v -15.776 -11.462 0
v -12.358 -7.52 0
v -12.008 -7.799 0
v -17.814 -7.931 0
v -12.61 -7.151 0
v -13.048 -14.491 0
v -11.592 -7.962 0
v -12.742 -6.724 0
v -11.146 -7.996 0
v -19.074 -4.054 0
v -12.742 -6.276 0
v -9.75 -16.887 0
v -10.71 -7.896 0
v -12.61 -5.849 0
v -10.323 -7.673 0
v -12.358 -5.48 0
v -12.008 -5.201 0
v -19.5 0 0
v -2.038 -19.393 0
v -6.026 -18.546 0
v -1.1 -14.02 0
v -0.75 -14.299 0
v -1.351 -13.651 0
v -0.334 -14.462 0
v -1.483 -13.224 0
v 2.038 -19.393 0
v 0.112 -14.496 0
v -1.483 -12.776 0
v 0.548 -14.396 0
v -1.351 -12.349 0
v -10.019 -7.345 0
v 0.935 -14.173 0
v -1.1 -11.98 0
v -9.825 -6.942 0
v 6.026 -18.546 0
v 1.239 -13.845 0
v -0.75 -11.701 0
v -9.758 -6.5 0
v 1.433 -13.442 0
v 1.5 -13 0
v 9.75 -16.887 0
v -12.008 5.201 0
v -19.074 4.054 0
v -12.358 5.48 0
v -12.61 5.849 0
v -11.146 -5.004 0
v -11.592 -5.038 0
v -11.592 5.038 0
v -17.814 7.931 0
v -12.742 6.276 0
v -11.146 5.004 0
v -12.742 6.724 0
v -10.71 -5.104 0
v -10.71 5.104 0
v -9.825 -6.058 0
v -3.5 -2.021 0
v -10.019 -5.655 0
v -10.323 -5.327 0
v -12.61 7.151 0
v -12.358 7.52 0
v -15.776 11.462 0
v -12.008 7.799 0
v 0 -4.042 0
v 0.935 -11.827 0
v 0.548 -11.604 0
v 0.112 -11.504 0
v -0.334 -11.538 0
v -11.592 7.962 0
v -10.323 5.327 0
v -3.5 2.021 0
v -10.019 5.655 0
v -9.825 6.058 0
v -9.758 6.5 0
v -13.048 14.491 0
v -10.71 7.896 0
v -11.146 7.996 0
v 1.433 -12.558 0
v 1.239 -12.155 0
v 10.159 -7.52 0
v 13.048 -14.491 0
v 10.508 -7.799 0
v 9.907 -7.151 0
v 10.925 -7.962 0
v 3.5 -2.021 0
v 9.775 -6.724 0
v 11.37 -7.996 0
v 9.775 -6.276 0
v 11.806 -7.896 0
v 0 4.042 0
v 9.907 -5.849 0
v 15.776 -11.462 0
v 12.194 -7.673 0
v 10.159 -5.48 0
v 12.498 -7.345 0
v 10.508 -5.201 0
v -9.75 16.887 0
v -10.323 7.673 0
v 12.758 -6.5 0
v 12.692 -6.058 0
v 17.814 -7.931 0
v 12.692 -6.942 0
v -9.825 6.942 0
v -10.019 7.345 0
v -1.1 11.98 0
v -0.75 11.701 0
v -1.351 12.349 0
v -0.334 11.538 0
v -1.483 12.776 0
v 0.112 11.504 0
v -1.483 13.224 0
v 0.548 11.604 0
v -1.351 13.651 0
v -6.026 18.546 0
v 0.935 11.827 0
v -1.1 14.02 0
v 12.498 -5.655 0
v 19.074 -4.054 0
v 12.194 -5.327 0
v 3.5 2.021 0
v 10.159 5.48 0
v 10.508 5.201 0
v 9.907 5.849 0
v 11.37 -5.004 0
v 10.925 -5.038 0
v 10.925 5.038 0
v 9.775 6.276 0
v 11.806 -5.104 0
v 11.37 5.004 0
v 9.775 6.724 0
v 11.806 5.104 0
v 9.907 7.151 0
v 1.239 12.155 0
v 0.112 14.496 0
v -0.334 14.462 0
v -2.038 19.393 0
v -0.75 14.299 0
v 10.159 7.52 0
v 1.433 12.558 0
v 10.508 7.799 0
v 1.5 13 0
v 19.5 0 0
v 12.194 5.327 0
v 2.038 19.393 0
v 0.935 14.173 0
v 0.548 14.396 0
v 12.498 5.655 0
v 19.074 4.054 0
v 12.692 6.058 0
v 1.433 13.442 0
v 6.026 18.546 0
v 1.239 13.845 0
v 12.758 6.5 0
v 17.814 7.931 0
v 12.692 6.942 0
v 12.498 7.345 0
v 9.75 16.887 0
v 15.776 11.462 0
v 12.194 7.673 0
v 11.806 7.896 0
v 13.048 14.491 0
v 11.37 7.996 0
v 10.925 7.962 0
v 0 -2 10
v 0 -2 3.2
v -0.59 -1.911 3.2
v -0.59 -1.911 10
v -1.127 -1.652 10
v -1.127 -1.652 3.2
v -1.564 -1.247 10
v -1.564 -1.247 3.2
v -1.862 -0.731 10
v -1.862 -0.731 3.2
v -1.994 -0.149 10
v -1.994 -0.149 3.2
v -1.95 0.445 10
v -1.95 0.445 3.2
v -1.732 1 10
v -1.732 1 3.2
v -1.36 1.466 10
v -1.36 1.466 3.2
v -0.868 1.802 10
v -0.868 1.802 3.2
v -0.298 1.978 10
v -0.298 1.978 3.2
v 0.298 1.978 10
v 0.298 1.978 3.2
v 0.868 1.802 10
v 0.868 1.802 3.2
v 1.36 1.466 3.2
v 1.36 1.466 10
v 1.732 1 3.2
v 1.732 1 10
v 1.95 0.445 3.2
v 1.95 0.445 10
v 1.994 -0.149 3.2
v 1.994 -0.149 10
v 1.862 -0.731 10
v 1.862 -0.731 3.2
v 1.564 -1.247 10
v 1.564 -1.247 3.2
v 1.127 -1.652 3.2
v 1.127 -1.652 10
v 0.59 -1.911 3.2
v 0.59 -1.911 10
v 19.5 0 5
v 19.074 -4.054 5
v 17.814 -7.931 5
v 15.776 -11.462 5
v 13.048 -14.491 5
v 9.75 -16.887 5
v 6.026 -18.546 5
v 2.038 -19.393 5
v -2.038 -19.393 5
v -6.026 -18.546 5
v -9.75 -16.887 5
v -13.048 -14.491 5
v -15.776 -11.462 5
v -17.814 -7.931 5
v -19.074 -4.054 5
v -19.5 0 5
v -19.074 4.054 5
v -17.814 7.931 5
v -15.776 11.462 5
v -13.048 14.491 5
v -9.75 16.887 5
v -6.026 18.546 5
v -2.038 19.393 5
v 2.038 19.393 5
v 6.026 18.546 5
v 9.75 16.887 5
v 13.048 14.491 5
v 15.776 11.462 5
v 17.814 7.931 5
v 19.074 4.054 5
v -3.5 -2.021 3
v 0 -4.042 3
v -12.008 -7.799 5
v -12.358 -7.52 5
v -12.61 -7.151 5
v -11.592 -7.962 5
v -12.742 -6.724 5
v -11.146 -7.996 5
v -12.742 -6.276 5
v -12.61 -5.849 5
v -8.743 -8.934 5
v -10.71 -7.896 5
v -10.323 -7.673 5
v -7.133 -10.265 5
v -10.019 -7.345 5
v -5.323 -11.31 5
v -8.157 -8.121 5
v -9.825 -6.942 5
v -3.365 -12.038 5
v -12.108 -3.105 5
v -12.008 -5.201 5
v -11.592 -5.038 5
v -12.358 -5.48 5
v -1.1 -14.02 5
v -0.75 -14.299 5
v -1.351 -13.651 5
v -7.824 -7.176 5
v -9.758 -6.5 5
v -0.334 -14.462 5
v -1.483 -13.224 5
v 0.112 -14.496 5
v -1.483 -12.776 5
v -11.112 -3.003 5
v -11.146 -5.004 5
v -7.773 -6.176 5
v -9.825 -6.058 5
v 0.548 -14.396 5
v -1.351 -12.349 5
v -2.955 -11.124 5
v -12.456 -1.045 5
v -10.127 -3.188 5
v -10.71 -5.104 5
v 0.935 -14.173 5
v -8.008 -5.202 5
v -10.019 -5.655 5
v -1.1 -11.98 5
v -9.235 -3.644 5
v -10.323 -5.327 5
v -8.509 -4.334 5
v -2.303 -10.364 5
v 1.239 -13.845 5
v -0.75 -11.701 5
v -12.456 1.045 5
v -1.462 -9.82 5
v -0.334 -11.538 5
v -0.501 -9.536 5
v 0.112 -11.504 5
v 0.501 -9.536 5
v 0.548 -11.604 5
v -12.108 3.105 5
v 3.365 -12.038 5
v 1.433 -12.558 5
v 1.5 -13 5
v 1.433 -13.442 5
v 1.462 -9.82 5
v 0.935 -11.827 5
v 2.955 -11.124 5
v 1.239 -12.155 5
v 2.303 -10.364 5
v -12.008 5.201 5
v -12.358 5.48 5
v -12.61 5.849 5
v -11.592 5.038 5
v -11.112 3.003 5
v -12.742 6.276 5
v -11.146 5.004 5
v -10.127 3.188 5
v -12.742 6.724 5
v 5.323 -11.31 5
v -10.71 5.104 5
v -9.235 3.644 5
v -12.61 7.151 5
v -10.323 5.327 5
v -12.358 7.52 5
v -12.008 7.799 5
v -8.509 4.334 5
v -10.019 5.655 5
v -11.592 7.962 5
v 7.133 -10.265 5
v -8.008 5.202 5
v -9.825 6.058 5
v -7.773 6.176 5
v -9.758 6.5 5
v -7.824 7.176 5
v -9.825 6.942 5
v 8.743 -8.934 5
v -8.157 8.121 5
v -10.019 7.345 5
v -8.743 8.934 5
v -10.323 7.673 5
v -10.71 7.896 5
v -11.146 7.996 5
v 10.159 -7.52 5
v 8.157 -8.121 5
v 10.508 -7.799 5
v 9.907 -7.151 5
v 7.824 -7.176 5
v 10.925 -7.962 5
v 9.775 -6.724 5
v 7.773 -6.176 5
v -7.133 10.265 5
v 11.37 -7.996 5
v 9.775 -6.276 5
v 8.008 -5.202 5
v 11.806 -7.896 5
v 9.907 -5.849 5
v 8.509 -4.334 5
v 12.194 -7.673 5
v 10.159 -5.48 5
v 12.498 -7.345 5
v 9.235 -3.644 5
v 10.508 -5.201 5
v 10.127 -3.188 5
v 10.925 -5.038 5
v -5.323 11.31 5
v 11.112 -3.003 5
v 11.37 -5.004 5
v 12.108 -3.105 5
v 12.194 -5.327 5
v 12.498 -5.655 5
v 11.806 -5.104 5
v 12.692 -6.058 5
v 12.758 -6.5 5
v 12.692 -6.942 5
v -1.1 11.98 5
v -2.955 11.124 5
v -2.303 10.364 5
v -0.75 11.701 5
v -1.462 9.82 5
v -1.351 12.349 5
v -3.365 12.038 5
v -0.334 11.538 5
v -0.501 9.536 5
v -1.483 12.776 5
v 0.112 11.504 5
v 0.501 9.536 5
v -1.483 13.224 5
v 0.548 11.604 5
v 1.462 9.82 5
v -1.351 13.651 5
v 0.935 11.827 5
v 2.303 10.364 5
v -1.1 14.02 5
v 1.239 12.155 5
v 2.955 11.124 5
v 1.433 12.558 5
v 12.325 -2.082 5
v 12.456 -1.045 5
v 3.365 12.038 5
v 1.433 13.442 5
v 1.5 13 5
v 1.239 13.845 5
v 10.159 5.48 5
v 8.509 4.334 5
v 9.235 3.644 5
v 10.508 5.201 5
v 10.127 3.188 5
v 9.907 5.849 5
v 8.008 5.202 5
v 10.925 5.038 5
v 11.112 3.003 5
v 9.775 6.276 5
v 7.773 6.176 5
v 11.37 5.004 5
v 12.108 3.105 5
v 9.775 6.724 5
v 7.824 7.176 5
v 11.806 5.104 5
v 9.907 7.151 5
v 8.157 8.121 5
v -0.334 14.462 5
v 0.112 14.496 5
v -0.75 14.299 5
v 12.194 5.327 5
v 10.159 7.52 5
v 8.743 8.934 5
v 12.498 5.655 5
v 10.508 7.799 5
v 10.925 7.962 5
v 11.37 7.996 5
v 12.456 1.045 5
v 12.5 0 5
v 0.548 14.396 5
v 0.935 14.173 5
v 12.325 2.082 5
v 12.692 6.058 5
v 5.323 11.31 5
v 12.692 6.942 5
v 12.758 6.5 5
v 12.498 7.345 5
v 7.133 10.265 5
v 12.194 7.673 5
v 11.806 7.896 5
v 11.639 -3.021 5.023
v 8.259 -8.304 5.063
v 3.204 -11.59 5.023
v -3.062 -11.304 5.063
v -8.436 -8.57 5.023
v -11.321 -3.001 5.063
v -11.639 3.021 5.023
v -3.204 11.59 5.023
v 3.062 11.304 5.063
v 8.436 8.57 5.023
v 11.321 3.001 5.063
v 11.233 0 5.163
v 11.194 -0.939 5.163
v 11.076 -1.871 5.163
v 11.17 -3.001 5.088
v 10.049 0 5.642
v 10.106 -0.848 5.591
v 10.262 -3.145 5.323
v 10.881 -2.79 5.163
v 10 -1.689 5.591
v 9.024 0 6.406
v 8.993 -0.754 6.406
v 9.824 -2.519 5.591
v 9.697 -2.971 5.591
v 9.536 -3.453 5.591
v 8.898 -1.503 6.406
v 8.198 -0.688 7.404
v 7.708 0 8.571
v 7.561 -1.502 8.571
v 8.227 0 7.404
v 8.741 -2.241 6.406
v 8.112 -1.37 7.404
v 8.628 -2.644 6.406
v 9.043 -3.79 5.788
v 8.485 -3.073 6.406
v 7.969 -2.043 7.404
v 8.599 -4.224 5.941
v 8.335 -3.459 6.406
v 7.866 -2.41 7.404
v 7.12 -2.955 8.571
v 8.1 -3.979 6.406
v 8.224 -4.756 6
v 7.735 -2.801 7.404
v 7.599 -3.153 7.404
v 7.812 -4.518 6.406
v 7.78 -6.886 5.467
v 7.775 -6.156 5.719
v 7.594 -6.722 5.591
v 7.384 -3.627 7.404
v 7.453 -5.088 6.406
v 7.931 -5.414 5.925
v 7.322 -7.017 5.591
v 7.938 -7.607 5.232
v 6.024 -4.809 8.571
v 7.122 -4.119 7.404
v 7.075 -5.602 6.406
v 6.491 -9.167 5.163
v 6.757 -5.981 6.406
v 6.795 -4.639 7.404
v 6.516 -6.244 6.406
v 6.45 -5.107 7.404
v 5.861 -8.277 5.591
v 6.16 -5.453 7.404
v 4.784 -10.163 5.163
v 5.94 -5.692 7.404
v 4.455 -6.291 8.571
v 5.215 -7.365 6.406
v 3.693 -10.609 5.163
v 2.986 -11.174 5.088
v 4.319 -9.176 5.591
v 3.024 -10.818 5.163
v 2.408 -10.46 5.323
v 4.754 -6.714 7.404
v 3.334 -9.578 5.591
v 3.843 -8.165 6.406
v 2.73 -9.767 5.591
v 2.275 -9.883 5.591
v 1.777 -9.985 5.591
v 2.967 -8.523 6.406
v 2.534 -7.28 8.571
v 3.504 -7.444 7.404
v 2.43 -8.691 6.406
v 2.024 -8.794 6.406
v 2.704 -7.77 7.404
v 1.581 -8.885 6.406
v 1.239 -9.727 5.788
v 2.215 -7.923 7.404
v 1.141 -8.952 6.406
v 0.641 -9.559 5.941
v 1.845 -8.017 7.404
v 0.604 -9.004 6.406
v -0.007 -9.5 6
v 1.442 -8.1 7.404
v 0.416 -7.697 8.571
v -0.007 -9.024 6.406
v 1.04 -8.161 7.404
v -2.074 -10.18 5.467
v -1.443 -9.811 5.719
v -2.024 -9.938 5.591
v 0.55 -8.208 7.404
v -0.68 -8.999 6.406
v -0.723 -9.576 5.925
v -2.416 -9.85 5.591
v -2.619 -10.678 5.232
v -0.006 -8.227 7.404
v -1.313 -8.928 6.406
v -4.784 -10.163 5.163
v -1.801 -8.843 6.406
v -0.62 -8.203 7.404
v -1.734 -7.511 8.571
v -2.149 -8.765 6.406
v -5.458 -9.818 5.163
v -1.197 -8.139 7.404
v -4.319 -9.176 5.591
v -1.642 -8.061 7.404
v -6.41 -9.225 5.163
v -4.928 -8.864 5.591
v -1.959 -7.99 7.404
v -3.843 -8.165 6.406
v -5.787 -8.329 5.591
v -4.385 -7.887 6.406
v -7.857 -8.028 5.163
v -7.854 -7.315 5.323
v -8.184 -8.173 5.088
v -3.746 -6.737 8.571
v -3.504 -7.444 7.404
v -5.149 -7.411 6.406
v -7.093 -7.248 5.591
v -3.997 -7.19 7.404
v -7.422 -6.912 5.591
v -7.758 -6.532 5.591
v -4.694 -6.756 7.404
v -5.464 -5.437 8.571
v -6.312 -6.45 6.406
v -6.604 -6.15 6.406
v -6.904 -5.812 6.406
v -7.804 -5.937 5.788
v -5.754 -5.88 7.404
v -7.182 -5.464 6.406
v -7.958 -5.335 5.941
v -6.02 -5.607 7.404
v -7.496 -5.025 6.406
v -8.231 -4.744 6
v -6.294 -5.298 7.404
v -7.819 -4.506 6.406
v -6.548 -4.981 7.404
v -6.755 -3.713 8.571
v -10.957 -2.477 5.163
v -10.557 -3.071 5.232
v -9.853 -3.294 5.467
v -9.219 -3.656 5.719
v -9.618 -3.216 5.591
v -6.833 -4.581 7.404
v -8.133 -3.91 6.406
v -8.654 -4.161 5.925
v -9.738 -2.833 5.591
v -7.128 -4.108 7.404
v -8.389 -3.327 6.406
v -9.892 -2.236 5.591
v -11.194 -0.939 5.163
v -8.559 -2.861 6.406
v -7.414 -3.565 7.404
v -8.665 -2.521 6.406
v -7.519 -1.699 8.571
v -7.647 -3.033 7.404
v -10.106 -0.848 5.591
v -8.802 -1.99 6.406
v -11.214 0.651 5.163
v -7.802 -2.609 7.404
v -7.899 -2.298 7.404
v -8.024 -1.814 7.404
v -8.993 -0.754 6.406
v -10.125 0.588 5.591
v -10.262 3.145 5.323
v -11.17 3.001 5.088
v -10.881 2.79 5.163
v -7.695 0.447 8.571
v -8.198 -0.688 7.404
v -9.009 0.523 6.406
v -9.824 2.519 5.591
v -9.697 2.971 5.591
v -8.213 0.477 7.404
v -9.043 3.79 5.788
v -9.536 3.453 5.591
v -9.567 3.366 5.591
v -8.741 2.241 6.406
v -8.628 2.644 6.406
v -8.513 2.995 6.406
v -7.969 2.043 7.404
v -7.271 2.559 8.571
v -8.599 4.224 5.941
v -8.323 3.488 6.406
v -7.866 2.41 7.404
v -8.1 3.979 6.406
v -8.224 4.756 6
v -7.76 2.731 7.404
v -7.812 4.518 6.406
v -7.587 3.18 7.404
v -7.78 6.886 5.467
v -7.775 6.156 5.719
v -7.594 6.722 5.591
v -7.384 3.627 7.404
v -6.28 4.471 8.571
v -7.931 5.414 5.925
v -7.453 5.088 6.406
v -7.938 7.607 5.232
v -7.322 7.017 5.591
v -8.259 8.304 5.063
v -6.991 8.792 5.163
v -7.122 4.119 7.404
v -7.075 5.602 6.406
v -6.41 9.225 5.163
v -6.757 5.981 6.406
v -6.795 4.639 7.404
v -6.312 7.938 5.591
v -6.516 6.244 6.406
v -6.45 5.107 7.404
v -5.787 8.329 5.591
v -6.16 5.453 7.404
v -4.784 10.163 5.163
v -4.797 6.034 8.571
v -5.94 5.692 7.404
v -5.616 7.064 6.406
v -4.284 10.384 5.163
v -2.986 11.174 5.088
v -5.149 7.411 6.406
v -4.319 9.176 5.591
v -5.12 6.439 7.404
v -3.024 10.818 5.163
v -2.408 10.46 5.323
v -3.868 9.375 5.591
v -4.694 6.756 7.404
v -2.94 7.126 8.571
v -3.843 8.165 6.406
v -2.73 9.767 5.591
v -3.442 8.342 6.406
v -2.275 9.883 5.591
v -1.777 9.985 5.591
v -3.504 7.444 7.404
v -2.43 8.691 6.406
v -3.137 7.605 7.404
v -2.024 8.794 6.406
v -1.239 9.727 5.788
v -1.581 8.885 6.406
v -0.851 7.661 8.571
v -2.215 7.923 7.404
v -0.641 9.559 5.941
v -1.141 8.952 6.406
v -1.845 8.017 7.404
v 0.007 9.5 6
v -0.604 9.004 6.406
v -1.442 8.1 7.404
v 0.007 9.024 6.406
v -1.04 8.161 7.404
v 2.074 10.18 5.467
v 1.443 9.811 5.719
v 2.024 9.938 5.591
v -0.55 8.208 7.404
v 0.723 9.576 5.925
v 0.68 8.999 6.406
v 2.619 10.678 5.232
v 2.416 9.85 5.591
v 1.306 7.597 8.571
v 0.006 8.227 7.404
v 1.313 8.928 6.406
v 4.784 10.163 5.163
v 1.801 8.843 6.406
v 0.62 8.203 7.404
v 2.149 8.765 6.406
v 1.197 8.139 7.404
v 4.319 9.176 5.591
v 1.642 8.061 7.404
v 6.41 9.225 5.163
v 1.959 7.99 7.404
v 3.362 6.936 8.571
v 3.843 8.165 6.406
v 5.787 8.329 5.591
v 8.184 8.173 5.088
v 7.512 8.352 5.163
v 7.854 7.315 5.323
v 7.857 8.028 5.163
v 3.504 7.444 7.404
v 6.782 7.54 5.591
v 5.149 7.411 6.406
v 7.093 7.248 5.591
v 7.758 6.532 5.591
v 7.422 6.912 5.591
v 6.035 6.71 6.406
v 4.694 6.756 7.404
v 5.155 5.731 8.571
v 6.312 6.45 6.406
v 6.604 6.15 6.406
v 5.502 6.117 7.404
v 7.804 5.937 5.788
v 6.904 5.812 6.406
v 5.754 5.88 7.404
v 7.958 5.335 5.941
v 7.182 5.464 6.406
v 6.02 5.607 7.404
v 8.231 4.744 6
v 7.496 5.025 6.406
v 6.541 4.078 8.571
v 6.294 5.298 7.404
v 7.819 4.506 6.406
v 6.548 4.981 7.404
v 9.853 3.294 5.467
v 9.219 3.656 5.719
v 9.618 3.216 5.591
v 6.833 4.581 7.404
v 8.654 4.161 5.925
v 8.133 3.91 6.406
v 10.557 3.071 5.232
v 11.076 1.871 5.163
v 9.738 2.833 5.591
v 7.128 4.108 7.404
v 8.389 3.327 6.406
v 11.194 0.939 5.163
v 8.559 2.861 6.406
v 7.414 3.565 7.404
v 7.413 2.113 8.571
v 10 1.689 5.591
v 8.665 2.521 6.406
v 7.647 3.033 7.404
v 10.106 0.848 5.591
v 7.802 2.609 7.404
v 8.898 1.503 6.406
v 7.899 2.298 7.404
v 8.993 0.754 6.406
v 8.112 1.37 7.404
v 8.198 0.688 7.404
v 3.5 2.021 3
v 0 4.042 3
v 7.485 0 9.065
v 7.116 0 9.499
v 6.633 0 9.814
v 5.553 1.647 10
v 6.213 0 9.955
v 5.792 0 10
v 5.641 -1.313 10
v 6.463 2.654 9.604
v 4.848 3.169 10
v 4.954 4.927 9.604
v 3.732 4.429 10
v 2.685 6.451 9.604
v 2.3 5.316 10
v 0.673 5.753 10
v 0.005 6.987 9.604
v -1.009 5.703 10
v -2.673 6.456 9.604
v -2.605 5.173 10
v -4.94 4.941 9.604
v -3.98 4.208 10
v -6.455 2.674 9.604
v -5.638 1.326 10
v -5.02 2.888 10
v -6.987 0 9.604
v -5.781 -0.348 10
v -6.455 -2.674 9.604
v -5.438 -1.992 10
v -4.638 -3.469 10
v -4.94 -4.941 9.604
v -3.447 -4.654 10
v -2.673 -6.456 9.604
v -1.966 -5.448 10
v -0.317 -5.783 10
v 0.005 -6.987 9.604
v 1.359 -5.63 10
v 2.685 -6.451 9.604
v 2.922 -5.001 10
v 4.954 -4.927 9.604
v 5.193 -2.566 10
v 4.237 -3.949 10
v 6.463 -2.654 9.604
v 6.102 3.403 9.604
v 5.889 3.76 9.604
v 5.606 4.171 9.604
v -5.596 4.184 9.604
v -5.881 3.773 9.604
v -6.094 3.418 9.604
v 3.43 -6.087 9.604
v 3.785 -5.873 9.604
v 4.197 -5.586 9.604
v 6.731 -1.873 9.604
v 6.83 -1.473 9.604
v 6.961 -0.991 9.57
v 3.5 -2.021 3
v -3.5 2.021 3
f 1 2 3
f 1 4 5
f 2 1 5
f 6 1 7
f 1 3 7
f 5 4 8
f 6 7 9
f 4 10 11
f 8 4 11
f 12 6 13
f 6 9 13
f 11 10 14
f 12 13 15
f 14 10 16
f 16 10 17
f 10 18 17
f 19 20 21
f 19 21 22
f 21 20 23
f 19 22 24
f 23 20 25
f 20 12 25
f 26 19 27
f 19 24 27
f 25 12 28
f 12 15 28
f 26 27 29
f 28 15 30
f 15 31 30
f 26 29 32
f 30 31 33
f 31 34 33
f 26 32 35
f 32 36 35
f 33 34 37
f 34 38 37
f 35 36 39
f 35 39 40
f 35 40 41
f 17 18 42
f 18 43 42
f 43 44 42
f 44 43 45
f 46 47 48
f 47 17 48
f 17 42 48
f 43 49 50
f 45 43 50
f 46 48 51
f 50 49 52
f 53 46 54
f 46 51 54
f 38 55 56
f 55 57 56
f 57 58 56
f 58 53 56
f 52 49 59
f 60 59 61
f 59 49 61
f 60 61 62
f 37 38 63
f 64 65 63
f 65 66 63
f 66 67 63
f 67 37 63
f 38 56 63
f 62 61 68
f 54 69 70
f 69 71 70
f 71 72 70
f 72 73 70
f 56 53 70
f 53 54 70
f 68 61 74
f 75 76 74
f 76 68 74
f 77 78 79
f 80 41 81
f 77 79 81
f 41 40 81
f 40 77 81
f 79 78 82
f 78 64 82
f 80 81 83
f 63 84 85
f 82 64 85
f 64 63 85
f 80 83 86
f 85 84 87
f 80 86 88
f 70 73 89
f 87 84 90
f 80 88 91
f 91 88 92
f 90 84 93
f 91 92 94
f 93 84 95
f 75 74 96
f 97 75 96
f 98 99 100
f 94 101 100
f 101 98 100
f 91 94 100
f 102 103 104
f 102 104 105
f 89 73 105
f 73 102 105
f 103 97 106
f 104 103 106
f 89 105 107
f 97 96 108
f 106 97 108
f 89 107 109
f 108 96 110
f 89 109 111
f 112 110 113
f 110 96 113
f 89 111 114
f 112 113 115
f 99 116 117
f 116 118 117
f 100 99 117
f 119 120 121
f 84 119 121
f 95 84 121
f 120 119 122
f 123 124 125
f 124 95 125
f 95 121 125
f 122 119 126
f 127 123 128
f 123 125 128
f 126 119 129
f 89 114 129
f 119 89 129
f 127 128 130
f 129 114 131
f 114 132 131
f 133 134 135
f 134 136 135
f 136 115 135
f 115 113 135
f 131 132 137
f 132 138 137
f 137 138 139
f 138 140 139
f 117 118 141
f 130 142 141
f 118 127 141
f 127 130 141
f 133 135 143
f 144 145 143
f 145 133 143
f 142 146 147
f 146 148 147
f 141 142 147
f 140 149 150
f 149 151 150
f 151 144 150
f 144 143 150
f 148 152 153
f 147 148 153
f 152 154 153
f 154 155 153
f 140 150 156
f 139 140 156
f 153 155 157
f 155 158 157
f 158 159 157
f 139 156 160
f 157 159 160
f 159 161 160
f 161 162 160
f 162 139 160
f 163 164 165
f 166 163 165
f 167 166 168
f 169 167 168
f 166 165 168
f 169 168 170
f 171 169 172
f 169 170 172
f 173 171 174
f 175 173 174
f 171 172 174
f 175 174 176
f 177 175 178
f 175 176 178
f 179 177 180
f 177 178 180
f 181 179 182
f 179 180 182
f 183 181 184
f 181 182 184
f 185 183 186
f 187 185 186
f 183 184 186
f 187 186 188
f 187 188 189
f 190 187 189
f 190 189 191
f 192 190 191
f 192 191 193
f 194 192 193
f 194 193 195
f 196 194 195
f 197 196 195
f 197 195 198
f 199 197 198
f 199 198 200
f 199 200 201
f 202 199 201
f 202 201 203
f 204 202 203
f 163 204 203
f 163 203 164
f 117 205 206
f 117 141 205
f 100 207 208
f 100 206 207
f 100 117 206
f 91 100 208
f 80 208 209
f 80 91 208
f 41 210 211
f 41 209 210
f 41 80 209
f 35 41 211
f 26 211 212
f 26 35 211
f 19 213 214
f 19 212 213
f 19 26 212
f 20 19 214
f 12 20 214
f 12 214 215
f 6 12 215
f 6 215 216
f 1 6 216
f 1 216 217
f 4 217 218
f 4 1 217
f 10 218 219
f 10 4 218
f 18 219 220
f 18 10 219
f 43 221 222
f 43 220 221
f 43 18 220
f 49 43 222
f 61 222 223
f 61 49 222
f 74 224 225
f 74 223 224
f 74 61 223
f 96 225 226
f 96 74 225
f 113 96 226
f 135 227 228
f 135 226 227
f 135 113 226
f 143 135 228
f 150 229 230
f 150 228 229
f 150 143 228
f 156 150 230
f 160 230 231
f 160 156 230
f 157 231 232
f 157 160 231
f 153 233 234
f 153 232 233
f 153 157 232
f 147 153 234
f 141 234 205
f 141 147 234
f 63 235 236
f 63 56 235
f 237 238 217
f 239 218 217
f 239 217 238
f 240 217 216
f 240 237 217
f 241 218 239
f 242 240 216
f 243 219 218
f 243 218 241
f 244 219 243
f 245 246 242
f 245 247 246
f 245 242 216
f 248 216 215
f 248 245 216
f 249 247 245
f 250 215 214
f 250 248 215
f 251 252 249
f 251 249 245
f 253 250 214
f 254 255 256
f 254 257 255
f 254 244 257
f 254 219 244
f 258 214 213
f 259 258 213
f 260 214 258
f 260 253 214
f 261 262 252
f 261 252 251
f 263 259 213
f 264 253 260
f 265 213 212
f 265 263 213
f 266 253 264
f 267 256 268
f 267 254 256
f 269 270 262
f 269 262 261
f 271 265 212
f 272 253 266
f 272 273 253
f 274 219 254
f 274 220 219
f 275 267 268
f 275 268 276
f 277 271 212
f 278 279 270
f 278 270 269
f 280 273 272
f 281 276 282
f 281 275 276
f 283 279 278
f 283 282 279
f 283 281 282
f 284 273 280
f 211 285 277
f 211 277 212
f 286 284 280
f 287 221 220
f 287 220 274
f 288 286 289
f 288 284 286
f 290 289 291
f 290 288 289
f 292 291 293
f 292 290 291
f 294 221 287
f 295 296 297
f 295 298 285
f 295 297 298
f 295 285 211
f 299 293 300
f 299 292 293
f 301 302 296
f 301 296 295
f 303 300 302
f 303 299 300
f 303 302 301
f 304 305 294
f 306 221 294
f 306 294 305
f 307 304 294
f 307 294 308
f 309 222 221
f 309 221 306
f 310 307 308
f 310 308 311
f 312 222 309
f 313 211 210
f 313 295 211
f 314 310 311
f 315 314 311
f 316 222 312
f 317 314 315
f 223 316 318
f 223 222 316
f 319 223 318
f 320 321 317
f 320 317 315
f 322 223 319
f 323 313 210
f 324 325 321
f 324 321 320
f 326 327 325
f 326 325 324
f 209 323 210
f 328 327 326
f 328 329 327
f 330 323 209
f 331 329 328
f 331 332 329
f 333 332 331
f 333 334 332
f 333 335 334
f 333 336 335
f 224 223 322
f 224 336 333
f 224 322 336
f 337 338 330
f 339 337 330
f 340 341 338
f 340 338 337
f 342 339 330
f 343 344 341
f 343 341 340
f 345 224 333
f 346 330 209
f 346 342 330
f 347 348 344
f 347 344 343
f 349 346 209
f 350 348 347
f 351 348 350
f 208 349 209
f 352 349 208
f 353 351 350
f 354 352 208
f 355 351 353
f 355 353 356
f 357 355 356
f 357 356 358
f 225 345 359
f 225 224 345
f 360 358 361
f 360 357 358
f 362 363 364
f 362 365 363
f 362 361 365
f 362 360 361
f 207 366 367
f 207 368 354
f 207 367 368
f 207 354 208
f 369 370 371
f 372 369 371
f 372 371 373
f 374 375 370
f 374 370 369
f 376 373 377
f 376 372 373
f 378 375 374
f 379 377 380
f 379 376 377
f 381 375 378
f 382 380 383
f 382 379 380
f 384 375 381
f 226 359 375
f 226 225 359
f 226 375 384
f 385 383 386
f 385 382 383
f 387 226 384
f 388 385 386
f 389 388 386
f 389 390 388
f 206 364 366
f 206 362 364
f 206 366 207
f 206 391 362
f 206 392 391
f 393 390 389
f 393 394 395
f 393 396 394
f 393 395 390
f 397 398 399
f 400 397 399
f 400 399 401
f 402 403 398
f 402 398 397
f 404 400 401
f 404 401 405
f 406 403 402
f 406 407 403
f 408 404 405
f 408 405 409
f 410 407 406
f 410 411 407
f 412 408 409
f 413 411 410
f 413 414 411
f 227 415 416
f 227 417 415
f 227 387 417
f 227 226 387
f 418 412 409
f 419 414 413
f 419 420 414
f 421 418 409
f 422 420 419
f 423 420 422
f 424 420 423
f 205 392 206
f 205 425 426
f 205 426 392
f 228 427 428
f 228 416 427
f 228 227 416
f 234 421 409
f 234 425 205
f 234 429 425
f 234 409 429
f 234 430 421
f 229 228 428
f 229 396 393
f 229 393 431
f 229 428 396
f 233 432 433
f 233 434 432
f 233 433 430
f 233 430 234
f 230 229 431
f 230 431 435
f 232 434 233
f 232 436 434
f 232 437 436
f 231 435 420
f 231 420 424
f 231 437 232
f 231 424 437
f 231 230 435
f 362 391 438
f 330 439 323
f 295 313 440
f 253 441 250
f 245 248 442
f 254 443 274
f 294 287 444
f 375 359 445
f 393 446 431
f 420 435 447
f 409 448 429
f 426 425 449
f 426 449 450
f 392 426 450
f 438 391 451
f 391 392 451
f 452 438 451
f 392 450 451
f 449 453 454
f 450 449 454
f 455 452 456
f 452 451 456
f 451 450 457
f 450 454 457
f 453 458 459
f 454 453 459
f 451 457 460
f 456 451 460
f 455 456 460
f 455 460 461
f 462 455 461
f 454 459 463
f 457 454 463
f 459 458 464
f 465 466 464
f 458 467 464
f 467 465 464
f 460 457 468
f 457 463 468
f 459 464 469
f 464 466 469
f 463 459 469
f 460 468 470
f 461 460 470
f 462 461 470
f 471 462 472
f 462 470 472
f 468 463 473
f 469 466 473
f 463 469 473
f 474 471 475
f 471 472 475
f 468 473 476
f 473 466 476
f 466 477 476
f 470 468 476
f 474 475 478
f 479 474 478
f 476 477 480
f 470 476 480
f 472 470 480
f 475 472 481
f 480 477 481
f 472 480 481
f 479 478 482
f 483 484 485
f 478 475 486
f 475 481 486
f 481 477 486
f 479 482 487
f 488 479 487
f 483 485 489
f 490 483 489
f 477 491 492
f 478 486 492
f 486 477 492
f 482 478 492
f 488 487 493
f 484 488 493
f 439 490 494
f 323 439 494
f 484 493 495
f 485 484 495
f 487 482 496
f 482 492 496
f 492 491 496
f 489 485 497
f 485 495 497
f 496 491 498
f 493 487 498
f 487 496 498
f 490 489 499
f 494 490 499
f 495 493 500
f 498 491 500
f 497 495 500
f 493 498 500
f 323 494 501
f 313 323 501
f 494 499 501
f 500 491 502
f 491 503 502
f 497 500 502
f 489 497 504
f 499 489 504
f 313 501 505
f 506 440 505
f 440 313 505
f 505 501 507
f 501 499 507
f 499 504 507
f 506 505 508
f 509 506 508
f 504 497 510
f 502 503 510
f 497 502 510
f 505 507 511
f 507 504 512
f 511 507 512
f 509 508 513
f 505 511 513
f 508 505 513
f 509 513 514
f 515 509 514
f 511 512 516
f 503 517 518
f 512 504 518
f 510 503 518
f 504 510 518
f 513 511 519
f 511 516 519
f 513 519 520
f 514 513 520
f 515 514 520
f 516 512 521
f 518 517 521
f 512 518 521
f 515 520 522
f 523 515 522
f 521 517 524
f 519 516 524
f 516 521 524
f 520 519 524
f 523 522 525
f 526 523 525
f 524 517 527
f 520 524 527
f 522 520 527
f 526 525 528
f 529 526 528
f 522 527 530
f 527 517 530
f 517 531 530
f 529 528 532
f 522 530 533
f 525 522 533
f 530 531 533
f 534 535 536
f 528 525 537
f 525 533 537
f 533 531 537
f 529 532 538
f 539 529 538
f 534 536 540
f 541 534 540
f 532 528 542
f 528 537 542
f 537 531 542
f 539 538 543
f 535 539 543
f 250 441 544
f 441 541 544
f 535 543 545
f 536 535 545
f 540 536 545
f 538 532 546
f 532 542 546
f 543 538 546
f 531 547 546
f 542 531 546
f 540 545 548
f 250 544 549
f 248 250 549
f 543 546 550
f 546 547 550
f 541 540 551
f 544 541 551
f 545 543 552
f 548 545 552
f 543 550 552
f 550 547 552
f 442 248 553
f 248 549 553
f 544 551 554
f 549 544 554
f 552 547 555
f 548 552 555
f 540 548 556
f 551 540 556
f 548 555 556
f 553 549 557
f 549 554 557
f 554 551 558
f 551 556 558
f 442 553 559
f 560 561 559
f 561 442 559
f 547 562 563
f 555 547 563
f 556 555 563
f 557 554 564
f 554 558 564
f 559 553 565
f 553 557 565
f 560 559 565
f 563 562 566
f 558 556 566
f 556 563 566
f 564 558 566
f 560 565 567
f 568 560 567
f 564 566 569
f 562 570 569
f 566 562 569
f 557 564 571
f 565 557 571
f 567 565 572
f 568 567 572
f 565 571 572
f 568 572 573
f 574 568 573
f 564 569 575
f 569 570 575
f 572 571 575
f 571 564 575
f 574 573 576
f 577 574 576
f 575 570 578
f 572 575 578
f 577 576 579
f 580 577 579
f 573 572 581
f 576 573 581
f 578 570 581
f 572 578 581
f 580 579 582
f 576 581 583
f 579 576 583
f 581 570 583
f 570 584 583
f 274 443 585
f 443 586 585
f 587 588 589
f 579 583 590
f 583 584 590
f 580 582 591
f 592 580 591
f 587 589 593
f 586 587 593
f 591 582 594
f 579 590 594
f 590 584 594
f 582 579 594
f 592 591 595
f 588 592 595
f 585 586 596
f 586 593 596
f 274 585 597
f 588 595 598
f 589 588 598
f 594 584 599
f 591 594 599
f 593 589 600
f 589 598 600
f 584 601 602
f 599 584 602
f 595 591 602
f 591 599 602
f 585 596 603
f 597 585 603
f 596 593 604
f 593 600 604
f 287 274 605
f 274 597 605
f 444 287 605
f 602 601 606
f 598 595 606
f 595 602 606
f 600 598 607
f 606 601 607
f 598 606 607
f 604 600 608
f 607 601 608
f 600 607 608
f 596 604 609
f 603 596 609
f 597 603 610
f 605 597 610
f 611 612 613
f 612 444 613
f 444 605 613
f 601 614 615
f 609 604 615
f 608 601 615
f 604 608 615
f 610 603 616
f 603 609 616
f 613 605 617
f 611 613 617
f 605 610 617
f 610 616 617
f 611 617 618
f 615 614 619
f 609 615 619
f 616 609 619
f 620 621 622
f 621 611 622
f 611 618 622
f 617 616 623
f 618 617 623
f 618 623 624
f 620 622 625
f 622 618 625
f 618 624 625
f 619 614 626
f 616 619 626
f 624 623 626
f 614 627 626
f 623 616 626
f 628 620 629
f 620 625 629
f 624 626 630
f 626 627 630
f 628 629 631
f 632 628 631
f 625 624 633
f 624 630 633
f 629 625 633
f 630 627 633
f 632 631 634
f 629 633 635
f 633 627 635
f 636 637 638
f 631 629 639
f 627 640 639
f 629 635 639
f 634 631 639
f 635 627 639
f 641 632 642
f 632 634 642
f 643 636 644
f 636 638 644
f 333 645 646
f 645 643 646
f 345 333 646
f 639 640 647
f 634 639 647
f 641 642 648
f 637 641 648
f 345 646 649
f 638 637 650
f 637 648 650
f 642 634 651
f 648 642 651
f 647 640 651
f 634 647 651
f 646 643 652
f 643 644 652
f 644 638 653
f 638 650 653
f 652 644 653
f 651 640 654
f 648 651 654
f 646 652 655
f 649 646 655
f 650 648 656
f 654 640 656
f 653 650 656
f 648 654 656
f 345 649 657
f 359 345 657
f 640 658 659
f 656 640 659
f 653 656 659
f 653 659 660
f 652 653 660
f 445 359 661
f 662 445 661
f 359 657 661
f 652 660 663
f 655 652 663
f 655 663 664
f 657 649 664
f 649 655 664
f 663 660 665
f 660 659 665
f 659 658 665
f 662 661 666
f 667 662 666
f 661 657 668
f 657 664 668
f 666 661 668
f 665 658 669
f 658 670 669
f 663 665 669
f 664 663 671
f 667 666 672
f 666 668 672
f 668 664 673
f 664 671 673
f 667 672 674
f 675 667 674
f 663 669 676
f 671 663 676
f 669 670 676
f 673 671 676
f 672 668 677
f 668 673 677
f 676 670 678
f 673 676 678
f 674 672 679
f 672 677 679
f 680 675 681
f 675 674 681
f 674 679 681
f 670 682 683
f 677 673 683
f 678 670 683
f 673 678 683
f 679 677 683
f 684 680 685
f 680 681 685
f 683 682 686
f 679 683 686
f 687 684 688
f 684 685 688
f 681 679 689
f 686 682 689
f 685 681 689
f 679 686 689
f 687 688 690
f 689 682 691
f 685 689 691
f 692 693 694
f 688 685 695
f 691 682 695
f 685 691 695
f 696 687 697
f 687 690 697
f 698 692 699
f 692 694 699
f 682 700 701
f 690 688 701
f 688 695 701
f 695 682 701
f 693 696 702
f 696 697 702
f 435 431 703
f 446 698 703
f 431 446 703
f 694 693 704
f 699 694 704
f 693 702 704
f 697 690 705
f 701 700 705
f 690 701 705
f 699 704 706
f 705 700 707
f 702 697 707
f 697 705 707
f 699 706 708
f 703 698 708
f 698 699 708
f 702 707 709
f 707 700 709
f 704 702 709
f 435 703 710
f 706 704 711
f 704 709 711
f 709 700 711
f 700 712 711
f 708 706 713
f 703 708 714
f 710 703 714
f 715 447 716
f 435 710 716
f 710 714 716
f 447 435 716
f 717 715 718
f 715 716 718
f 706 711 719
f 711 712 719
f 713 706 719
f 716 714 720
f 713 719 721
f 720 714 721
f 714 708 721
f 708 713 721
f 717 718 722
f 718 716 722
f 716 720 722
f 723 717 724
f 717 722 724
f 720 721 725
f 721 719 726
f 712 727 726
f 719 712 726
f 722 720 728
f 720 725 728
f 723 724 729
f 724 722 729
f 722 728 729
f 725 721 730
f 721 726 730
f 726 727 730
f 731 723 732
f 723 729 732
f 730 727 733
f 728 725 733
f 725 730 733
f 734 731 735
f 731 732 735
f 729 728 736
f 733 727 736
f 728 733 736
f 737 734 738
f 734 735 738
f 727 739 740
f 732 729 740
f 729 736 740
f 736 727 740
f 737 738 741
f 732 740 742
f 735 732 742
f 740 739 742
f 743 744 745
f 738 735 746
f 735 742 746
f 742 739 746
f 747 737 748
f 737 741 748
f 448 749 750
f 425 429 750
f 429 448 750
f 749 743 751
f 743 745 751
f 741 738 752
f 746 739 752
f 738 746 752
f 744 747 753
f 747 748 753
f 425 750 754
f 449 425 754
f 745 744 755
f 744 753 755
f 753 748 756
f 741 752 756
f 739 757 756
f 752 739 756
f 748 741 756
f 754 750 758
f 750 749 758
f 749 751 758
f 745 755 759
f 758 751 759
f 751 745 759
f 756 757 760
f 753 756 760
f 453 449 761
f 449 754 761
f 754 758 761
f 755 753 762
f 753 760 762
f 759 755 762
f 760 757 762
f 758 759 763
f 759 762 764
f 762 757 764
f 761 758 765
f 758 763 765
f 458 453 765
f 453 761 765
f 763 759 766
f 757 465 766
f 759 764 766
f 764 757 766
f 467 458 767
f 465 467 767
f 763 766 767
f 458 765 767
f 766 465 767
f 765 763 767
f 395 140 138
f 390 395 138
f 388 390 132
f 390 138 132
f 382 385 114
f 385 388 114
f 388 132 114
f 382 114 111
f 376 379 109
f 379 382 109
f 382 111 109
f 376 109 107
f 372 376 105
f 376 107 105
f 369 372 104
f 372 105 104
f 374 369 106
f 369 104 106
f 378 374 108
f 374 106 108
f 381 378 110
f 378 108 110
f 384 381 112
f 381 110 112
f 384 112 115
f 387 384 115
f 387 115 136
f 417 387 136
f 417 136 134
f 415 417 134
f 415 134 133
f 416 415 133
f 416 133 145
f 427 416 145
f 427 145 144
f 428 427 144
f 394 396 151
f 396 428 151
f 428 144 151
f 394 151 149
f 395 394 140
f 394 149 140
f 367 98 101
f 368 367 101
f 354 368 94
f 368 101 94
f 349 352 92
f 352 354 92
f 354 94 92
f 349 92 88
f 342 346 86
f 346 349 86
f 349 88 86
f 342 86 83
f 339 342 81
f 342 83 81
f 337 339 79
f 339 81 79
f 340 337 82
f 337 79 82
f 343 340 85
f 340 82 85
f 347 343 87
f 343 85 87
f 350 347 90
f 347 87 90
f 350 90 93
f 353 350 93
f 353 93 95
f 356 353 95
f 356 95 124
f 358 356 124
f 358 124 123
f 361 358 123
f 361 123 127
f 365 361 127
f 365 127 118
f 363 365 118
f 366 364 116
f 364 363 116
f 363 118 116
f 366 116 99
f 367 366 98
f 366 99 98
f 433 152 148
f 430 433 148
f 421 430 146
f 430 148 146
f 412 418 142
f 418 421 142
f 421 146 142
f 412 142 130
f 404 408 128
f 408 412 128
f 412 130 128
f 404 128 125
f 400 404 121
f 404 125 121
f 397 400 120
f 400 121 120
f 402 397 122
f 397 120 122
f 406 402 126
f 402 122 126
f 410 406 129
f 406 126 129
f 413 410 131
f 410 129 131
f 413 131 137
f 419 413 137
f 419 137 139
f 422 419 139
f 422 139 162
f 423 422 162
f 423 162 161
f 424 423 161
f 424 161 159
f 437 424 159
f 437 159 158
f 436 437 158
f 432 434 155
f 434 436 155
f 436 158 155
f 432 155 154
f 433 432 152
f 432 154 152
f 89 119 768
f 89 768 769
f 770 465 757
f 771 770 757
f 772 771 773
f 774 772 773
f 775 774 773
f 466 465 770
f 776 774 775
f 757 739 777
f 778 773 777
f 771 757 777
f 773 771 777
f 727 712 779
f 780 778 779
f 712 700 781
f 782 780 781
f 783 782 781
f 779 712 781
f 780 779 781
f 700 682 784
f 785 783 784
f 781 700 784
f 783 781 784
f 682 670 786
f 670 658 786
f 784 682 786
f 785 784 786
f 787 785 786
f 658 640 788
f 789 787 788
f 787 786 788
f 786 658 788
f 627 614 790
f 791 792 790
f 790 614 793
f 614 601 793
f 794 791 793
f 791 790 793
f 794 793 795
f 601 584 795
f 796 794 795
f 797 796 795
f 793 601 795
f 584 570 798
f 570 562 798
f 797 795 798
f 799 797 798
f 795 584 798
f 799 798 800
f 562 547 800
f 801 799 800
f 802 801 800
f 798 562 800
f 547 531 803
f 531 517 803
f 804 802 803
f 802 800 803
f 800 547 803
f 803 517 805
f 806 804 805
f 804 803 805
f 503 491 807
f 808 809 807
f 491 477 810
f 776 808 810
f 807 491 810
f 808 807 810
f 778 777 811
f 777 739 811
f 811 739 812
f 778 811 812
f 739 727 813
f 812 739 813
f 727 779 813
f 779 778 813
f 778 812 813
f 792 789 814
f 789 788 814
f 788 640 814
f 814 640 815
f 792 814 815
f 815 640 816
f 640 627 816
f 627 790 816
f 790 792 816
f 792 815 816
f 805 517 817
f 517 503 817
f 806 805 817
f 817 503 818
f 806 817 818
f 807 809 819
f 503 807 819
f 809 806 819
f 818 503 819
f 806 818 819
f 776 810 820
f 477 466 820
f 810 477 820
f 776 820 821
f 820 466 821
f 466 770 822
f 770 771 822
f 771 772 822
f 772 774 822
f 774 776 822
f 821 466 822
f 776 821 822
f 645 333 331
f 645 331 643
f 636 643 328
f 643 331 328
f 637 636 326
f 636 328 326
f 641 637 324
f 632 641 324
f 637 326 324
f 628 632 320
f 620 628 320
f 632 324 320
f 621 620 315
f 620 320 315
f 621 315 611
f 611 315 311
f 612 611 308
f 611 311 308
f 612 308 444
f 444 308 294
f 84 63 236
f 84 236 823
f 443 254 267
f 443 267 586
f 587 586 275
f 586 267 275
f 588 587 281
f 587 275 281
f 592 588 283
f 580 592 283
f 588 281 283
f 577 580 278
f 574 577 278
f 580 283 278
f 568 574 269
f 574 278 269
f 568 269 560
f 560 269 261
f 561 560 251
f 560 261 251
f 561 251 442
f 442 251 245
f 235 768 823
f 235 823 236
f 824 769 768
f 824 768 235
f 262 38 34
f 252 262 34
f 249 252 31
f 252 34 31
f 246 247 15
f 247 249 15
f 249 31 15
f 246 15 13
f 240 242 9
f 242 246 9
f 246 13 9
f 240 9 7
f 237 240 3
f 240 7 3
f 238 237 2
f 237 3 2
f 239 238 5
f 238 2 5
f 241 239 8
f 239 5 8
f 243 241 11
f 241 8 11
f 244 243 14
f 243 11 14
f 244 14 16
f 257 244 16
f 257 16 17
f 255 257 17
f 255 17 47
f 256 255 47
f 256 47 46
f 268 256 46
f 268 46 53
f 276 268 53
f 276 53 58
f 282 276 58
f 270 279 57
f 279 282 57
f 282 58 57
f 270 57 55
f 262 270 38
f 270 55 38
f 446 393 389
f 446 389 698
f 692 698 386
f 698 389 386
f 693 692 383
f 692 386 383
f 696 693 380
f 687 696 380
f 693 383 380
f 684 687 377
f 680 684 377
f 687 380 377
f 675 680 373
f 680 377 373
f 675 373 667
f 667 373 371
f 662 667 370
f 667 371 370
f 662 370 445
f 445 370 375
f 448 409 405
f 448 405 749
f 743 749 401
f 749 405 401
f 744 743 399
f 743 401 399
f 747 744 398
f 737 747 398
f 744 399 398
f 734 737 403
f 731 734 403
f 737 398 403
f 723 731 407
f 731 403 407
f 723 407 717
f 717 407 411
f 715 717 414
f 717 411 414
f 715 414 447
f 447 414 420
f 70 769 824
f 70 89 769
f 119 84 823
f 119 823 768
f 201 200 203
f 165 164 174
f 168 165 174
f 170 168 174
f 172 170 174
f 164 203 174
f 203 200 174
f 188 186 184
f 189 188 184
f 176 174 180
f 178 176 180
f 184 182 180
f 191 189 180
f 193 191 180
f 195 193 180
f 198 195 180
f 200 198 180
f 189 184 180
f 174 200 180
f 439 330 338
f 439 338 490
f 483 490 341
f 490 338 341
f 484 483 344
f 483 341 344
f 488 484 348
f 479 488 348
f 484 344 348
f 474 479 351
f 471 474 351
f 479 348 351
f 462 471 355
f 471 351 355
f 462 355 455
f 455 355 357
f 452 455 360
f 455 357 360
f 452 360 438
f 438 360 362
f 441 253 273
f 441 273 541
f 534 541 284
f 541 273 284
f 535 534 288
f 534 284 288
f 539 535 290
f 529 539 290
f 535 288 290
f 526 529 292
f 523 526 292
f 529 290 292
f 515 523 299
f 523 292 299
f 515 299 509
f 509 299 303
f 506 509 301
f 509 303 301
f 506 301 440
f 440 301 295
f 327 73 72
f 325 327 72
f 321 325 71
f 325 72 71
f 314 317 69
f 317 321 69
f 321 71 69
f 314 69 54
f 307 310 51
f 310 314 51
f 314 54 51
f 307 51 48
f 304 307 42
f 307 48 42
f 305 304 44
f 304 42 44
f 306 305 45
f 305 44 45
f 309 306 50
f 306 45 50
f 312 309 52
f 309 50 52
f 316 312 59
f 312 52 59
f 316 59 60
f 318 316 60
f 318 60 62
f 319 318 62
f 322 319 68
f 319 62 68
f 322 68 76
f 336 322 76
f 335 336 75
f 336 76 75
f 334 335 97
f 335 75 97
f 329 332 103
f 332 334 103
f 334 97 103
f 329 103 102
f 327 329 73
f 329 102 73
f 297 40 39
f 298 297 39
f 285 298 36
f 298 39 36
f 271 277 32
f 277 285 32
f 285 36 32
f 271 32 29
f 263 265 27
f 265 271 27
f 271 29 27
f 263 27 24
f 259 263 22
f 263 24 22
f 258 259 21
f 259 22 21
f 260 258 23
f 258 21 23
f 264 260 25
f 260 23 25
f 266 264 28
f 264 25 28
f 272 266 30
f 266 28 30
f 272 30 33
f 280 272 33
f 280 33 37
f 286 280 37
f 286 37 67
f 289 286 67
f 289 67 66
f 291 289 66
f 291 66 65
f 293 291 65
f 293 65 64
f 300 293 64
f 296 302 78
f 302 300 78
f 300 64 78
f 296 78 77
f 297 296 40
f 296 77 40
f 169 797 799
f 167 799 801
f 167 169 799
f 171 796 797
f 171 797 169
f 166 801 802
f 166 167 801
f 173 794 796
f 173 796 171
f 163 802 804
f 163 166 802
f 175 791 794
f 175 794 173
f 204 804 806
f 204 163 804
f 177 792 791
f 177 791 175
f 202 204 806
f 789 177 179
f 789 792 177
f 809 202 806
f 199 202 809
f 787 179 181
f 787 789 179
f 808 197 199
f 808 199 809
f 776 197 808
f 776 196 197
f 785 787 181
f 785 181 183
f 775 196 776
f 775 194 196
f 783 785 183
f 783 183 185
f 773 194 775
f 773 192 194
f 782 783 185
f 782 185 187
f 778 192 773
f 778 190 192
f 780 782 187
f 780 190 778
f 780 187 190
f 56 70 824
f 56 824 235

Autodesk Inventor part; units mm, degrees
ref_plane "YZ Plane" through (0, 0, 0) normal (1, 0, 0) x (0, 1, 0)
ref_plane "XZ Plane" through (0, 0, 0) normal (0, 1, 0) x (-1, 0, 0)
ref_plane "XY Plane" through (0, 0, 0) normal (0, 0, 1) x (1, 0, 0)
sketch "Skizze1" plane through (0, 0, 0) normal (0, 0, 1) x (1, 0, 0)
  circle A0 centre (-11.2583, 6.5) radius 1.5 projected
  circle A1 centre (-11.2583, -6.5) radius 1.5 projected
  circle A2 centre (0, -13) radius 1.5 projected
  circle A3 centre (11.2583, -6.5) radius 1.5 projected
  circle A4 centre (11.2583, 6.5) radius 1.5 projected
  circle A5 centre (0, 13) radius 1.5 projected
  arc A6 (14.3761, 1.8914) -> (11.9393, 3.5783) centre (12.3932, 1.6305) ccw projected
  arc A7 (14.3761, -1.8914) -> (14.3761, 1.8914) centre (0, 0) ccw projected
  arc A8 (11.9393, -3.5783) -> (14.3761, -1.8914) centre (12.3932, -1.6305) ccw projected
  arc A9 (11.9393, -3.5783) -> (9.0685, -8.5505) centre (11.2583, -6.5) ccw projected
  arc A10 (8.826, -11.5044) -> (9.0685, -8.5505) centre (7.6087, -9.9176) ccw projected
  arc A11 (5.5501, -13.3958) -> (8.826, -11.5044) centre (0, 0) ccw projected
  arc A12 (2.8707, -12.1288) -> (5.5501, -13.3958) centre (4.7846, -11.5481) ccw projected
  arc A13 (2.8707, -12.1288) -> (-2.8707, -12.1288) centre (0, -13) ccw projected
  arc A14 (-5.5501, -13.3958) -> (-2.8707, -12.1288) centre (-4.7846, -11.5481) ccw projected
  arc A15 (-8.826, -11.5044) -> (-5.5501, -13.3958) centre (0, 0) ccw projected
  arc A16 (-9.0685, -8.5505) -> (-8.826, -11.5044) centre (-7.6087, -9.9176) ccw projected
  arc A17 (-9.0685, -8.5505) -> (-11.9393, -3.5783) centre (-11.2583, -6.5) ccw projected
  arc A18 (-14.3761, -1.8914) -> (-11.9393, -3.5783) centre (-12.3932, -1.6305) ccw projected
  arc A19 (-14.3761, 1.8914) -> (-14.3761, -1.8914) centre (0, 0) ccw projected
  arc A20 (-11.9393, 3.5783) -> (-14.3761, 1.8914) centre (-12.3932, 1.6305) ccw projected
  arc A21 (-11.9393, 3.5783) -> (-9.0685, 8.5505) centre (-11.2583, 6.5) ccw projected
  arc A22 (-8.826, 11.5044) -> (-9.0685, 8.5505) centre (-7.6087, 9.9176) ccw projected
  arc A23 (-5.5501, 13.3958) -> (-8.826, 11.5044) centre (0, 0) ccw projected
  arc A24 (-2.8707, 12.1288) -> (-5.5501, 13.3958) centre (-4.7846, 11.5481) ccw projected
  arc A25 (-2.8707, 12.1288) -> (2.8707, 12.1288) centre (0, 13) ccw projected
  arc A26 (5.5501, 13.3958) -> (2.8707, 12.1288) centre (4.7846, 11.5481) ccw projected
  arc A27 (8.826, 11.5044) -> (5.5501, 13.3958) centre (0, 0) ccw projected
  arc A28 (9.0685, 8.5505) -> (8.826, 11.5044) centre (7.6087, 9.9176) ccw projected
  arc A29 (9.0685, 8.5505) -> (11.9393, 3.5783) centre (11.2583, 6.5) ccw projected
  circle A30 centre (0, 0) radius 17.5 projected
  circle A31 centre (0, 0) radius 19.5
  point P0 (0, 0)
  dimension "d0" = 39
extrude "Extrusion1" add sketch "Skizze1" along normal blind 5 contours A7 A8 A9 A10 A11 A12 A13 A14 A15 A16 A17 A18 A19 A20 A21 A22 A23 A24 A25 A26 A27 A28 A29 A6 | A30 | A31
sketch "Skizze2" plane through (0, 0, 5) normal (0, 0, 1) x (1, 0, 0)
  circle A0 centre (0, 0) radius 7.5
  dimension "d3" = 15
extrude "Extrusion2" add sketch "Skizze2" along normal blind 5
sketch "Skizze6" plane through (0, 0, 5) normal (0, 0, 1) x (1, 0, 0)
  circle A0 centre (0, 0) radius 7.5 projected
  circle A1 centre (0, 13) radius 1.5 projected
  circle A2 centre (11.2583, 6.5) radius 1.5 projected
  circle A3 centre (11.2583, -6.5) radius 1.5 projected
  circle A4 centre (0, -13) radius 1.5 projected
  circle A5 centre (-11.2583, -6.5) radius 1.5 projected
  circle A6 centre (-11.2583, 6.5) radius 1.5 projected
  circle A7 centre (0, 0) radius 19.5 projected
  circle A8 centre (11.2583, 6.5) radius 3.5
  dimension "d20" = 7
fillet "Rundung1" radius 5 1 edges at (-7.5, 0, 5)
fillet "Rundung2" radius 2 1 edges at (-7.5, 0, 10)
sketch "Skizze3" plane through (0, 0, 0) normal (0, 0, -1) x (-1, 0, 0)
  line L0 (0, -4.0415) -> (-3.5, -2.0207)
  line L1 (-3.5, -2.0207) -> (-3.5, 2.0207)
  line L2 (-3.5, 2.0207) -> (0, 4.0415)
  line L3 (0, 4.0415) -> (3.5, 2.0207)
  line L4 (3.5, 2.0207) -> (3.5, -2.0207)
  line L5 (3.5, -2.0207) -> (0, -4.0415)
  point P0 (0, 0)
  point P1 (0, 0)
  dimension "d8" = 7
sketch "Skizze4" plane through (0, 0, 10) normal (0, 0, 1) x (1, 0, 0)
  point P0 (0, 0)
hole "Bohrung1" at (0, 0, 10) direction (0, 0, -1) diameter 4 end through all
extrude "Extrusion3" cut sketch "Skizze3" against normal blind 3
sketch "Skizze5" plane through (0, 0, 3) normal (0, 0, -1) x (-1, 0, 0)
  circle A0 centre (0, 0) radius 2 projected
  circle A1 centre (0, 0) radius 2 projected
extrude "Extrusion4" add sketch "Skizze5" against normal blind 0.2
extrude "Extrusion5" cut sketch "Skizze6" along normal blind 10 contours A2 | A8
pattern_circular "Runde Anordnung1" count 6 over 360 about axis through (0, 0, -46.0535) along (0, 0, 1) of "Extrusion5"
properties part number "GripperMountPlatehock" material "ABS-Kunststoff"
